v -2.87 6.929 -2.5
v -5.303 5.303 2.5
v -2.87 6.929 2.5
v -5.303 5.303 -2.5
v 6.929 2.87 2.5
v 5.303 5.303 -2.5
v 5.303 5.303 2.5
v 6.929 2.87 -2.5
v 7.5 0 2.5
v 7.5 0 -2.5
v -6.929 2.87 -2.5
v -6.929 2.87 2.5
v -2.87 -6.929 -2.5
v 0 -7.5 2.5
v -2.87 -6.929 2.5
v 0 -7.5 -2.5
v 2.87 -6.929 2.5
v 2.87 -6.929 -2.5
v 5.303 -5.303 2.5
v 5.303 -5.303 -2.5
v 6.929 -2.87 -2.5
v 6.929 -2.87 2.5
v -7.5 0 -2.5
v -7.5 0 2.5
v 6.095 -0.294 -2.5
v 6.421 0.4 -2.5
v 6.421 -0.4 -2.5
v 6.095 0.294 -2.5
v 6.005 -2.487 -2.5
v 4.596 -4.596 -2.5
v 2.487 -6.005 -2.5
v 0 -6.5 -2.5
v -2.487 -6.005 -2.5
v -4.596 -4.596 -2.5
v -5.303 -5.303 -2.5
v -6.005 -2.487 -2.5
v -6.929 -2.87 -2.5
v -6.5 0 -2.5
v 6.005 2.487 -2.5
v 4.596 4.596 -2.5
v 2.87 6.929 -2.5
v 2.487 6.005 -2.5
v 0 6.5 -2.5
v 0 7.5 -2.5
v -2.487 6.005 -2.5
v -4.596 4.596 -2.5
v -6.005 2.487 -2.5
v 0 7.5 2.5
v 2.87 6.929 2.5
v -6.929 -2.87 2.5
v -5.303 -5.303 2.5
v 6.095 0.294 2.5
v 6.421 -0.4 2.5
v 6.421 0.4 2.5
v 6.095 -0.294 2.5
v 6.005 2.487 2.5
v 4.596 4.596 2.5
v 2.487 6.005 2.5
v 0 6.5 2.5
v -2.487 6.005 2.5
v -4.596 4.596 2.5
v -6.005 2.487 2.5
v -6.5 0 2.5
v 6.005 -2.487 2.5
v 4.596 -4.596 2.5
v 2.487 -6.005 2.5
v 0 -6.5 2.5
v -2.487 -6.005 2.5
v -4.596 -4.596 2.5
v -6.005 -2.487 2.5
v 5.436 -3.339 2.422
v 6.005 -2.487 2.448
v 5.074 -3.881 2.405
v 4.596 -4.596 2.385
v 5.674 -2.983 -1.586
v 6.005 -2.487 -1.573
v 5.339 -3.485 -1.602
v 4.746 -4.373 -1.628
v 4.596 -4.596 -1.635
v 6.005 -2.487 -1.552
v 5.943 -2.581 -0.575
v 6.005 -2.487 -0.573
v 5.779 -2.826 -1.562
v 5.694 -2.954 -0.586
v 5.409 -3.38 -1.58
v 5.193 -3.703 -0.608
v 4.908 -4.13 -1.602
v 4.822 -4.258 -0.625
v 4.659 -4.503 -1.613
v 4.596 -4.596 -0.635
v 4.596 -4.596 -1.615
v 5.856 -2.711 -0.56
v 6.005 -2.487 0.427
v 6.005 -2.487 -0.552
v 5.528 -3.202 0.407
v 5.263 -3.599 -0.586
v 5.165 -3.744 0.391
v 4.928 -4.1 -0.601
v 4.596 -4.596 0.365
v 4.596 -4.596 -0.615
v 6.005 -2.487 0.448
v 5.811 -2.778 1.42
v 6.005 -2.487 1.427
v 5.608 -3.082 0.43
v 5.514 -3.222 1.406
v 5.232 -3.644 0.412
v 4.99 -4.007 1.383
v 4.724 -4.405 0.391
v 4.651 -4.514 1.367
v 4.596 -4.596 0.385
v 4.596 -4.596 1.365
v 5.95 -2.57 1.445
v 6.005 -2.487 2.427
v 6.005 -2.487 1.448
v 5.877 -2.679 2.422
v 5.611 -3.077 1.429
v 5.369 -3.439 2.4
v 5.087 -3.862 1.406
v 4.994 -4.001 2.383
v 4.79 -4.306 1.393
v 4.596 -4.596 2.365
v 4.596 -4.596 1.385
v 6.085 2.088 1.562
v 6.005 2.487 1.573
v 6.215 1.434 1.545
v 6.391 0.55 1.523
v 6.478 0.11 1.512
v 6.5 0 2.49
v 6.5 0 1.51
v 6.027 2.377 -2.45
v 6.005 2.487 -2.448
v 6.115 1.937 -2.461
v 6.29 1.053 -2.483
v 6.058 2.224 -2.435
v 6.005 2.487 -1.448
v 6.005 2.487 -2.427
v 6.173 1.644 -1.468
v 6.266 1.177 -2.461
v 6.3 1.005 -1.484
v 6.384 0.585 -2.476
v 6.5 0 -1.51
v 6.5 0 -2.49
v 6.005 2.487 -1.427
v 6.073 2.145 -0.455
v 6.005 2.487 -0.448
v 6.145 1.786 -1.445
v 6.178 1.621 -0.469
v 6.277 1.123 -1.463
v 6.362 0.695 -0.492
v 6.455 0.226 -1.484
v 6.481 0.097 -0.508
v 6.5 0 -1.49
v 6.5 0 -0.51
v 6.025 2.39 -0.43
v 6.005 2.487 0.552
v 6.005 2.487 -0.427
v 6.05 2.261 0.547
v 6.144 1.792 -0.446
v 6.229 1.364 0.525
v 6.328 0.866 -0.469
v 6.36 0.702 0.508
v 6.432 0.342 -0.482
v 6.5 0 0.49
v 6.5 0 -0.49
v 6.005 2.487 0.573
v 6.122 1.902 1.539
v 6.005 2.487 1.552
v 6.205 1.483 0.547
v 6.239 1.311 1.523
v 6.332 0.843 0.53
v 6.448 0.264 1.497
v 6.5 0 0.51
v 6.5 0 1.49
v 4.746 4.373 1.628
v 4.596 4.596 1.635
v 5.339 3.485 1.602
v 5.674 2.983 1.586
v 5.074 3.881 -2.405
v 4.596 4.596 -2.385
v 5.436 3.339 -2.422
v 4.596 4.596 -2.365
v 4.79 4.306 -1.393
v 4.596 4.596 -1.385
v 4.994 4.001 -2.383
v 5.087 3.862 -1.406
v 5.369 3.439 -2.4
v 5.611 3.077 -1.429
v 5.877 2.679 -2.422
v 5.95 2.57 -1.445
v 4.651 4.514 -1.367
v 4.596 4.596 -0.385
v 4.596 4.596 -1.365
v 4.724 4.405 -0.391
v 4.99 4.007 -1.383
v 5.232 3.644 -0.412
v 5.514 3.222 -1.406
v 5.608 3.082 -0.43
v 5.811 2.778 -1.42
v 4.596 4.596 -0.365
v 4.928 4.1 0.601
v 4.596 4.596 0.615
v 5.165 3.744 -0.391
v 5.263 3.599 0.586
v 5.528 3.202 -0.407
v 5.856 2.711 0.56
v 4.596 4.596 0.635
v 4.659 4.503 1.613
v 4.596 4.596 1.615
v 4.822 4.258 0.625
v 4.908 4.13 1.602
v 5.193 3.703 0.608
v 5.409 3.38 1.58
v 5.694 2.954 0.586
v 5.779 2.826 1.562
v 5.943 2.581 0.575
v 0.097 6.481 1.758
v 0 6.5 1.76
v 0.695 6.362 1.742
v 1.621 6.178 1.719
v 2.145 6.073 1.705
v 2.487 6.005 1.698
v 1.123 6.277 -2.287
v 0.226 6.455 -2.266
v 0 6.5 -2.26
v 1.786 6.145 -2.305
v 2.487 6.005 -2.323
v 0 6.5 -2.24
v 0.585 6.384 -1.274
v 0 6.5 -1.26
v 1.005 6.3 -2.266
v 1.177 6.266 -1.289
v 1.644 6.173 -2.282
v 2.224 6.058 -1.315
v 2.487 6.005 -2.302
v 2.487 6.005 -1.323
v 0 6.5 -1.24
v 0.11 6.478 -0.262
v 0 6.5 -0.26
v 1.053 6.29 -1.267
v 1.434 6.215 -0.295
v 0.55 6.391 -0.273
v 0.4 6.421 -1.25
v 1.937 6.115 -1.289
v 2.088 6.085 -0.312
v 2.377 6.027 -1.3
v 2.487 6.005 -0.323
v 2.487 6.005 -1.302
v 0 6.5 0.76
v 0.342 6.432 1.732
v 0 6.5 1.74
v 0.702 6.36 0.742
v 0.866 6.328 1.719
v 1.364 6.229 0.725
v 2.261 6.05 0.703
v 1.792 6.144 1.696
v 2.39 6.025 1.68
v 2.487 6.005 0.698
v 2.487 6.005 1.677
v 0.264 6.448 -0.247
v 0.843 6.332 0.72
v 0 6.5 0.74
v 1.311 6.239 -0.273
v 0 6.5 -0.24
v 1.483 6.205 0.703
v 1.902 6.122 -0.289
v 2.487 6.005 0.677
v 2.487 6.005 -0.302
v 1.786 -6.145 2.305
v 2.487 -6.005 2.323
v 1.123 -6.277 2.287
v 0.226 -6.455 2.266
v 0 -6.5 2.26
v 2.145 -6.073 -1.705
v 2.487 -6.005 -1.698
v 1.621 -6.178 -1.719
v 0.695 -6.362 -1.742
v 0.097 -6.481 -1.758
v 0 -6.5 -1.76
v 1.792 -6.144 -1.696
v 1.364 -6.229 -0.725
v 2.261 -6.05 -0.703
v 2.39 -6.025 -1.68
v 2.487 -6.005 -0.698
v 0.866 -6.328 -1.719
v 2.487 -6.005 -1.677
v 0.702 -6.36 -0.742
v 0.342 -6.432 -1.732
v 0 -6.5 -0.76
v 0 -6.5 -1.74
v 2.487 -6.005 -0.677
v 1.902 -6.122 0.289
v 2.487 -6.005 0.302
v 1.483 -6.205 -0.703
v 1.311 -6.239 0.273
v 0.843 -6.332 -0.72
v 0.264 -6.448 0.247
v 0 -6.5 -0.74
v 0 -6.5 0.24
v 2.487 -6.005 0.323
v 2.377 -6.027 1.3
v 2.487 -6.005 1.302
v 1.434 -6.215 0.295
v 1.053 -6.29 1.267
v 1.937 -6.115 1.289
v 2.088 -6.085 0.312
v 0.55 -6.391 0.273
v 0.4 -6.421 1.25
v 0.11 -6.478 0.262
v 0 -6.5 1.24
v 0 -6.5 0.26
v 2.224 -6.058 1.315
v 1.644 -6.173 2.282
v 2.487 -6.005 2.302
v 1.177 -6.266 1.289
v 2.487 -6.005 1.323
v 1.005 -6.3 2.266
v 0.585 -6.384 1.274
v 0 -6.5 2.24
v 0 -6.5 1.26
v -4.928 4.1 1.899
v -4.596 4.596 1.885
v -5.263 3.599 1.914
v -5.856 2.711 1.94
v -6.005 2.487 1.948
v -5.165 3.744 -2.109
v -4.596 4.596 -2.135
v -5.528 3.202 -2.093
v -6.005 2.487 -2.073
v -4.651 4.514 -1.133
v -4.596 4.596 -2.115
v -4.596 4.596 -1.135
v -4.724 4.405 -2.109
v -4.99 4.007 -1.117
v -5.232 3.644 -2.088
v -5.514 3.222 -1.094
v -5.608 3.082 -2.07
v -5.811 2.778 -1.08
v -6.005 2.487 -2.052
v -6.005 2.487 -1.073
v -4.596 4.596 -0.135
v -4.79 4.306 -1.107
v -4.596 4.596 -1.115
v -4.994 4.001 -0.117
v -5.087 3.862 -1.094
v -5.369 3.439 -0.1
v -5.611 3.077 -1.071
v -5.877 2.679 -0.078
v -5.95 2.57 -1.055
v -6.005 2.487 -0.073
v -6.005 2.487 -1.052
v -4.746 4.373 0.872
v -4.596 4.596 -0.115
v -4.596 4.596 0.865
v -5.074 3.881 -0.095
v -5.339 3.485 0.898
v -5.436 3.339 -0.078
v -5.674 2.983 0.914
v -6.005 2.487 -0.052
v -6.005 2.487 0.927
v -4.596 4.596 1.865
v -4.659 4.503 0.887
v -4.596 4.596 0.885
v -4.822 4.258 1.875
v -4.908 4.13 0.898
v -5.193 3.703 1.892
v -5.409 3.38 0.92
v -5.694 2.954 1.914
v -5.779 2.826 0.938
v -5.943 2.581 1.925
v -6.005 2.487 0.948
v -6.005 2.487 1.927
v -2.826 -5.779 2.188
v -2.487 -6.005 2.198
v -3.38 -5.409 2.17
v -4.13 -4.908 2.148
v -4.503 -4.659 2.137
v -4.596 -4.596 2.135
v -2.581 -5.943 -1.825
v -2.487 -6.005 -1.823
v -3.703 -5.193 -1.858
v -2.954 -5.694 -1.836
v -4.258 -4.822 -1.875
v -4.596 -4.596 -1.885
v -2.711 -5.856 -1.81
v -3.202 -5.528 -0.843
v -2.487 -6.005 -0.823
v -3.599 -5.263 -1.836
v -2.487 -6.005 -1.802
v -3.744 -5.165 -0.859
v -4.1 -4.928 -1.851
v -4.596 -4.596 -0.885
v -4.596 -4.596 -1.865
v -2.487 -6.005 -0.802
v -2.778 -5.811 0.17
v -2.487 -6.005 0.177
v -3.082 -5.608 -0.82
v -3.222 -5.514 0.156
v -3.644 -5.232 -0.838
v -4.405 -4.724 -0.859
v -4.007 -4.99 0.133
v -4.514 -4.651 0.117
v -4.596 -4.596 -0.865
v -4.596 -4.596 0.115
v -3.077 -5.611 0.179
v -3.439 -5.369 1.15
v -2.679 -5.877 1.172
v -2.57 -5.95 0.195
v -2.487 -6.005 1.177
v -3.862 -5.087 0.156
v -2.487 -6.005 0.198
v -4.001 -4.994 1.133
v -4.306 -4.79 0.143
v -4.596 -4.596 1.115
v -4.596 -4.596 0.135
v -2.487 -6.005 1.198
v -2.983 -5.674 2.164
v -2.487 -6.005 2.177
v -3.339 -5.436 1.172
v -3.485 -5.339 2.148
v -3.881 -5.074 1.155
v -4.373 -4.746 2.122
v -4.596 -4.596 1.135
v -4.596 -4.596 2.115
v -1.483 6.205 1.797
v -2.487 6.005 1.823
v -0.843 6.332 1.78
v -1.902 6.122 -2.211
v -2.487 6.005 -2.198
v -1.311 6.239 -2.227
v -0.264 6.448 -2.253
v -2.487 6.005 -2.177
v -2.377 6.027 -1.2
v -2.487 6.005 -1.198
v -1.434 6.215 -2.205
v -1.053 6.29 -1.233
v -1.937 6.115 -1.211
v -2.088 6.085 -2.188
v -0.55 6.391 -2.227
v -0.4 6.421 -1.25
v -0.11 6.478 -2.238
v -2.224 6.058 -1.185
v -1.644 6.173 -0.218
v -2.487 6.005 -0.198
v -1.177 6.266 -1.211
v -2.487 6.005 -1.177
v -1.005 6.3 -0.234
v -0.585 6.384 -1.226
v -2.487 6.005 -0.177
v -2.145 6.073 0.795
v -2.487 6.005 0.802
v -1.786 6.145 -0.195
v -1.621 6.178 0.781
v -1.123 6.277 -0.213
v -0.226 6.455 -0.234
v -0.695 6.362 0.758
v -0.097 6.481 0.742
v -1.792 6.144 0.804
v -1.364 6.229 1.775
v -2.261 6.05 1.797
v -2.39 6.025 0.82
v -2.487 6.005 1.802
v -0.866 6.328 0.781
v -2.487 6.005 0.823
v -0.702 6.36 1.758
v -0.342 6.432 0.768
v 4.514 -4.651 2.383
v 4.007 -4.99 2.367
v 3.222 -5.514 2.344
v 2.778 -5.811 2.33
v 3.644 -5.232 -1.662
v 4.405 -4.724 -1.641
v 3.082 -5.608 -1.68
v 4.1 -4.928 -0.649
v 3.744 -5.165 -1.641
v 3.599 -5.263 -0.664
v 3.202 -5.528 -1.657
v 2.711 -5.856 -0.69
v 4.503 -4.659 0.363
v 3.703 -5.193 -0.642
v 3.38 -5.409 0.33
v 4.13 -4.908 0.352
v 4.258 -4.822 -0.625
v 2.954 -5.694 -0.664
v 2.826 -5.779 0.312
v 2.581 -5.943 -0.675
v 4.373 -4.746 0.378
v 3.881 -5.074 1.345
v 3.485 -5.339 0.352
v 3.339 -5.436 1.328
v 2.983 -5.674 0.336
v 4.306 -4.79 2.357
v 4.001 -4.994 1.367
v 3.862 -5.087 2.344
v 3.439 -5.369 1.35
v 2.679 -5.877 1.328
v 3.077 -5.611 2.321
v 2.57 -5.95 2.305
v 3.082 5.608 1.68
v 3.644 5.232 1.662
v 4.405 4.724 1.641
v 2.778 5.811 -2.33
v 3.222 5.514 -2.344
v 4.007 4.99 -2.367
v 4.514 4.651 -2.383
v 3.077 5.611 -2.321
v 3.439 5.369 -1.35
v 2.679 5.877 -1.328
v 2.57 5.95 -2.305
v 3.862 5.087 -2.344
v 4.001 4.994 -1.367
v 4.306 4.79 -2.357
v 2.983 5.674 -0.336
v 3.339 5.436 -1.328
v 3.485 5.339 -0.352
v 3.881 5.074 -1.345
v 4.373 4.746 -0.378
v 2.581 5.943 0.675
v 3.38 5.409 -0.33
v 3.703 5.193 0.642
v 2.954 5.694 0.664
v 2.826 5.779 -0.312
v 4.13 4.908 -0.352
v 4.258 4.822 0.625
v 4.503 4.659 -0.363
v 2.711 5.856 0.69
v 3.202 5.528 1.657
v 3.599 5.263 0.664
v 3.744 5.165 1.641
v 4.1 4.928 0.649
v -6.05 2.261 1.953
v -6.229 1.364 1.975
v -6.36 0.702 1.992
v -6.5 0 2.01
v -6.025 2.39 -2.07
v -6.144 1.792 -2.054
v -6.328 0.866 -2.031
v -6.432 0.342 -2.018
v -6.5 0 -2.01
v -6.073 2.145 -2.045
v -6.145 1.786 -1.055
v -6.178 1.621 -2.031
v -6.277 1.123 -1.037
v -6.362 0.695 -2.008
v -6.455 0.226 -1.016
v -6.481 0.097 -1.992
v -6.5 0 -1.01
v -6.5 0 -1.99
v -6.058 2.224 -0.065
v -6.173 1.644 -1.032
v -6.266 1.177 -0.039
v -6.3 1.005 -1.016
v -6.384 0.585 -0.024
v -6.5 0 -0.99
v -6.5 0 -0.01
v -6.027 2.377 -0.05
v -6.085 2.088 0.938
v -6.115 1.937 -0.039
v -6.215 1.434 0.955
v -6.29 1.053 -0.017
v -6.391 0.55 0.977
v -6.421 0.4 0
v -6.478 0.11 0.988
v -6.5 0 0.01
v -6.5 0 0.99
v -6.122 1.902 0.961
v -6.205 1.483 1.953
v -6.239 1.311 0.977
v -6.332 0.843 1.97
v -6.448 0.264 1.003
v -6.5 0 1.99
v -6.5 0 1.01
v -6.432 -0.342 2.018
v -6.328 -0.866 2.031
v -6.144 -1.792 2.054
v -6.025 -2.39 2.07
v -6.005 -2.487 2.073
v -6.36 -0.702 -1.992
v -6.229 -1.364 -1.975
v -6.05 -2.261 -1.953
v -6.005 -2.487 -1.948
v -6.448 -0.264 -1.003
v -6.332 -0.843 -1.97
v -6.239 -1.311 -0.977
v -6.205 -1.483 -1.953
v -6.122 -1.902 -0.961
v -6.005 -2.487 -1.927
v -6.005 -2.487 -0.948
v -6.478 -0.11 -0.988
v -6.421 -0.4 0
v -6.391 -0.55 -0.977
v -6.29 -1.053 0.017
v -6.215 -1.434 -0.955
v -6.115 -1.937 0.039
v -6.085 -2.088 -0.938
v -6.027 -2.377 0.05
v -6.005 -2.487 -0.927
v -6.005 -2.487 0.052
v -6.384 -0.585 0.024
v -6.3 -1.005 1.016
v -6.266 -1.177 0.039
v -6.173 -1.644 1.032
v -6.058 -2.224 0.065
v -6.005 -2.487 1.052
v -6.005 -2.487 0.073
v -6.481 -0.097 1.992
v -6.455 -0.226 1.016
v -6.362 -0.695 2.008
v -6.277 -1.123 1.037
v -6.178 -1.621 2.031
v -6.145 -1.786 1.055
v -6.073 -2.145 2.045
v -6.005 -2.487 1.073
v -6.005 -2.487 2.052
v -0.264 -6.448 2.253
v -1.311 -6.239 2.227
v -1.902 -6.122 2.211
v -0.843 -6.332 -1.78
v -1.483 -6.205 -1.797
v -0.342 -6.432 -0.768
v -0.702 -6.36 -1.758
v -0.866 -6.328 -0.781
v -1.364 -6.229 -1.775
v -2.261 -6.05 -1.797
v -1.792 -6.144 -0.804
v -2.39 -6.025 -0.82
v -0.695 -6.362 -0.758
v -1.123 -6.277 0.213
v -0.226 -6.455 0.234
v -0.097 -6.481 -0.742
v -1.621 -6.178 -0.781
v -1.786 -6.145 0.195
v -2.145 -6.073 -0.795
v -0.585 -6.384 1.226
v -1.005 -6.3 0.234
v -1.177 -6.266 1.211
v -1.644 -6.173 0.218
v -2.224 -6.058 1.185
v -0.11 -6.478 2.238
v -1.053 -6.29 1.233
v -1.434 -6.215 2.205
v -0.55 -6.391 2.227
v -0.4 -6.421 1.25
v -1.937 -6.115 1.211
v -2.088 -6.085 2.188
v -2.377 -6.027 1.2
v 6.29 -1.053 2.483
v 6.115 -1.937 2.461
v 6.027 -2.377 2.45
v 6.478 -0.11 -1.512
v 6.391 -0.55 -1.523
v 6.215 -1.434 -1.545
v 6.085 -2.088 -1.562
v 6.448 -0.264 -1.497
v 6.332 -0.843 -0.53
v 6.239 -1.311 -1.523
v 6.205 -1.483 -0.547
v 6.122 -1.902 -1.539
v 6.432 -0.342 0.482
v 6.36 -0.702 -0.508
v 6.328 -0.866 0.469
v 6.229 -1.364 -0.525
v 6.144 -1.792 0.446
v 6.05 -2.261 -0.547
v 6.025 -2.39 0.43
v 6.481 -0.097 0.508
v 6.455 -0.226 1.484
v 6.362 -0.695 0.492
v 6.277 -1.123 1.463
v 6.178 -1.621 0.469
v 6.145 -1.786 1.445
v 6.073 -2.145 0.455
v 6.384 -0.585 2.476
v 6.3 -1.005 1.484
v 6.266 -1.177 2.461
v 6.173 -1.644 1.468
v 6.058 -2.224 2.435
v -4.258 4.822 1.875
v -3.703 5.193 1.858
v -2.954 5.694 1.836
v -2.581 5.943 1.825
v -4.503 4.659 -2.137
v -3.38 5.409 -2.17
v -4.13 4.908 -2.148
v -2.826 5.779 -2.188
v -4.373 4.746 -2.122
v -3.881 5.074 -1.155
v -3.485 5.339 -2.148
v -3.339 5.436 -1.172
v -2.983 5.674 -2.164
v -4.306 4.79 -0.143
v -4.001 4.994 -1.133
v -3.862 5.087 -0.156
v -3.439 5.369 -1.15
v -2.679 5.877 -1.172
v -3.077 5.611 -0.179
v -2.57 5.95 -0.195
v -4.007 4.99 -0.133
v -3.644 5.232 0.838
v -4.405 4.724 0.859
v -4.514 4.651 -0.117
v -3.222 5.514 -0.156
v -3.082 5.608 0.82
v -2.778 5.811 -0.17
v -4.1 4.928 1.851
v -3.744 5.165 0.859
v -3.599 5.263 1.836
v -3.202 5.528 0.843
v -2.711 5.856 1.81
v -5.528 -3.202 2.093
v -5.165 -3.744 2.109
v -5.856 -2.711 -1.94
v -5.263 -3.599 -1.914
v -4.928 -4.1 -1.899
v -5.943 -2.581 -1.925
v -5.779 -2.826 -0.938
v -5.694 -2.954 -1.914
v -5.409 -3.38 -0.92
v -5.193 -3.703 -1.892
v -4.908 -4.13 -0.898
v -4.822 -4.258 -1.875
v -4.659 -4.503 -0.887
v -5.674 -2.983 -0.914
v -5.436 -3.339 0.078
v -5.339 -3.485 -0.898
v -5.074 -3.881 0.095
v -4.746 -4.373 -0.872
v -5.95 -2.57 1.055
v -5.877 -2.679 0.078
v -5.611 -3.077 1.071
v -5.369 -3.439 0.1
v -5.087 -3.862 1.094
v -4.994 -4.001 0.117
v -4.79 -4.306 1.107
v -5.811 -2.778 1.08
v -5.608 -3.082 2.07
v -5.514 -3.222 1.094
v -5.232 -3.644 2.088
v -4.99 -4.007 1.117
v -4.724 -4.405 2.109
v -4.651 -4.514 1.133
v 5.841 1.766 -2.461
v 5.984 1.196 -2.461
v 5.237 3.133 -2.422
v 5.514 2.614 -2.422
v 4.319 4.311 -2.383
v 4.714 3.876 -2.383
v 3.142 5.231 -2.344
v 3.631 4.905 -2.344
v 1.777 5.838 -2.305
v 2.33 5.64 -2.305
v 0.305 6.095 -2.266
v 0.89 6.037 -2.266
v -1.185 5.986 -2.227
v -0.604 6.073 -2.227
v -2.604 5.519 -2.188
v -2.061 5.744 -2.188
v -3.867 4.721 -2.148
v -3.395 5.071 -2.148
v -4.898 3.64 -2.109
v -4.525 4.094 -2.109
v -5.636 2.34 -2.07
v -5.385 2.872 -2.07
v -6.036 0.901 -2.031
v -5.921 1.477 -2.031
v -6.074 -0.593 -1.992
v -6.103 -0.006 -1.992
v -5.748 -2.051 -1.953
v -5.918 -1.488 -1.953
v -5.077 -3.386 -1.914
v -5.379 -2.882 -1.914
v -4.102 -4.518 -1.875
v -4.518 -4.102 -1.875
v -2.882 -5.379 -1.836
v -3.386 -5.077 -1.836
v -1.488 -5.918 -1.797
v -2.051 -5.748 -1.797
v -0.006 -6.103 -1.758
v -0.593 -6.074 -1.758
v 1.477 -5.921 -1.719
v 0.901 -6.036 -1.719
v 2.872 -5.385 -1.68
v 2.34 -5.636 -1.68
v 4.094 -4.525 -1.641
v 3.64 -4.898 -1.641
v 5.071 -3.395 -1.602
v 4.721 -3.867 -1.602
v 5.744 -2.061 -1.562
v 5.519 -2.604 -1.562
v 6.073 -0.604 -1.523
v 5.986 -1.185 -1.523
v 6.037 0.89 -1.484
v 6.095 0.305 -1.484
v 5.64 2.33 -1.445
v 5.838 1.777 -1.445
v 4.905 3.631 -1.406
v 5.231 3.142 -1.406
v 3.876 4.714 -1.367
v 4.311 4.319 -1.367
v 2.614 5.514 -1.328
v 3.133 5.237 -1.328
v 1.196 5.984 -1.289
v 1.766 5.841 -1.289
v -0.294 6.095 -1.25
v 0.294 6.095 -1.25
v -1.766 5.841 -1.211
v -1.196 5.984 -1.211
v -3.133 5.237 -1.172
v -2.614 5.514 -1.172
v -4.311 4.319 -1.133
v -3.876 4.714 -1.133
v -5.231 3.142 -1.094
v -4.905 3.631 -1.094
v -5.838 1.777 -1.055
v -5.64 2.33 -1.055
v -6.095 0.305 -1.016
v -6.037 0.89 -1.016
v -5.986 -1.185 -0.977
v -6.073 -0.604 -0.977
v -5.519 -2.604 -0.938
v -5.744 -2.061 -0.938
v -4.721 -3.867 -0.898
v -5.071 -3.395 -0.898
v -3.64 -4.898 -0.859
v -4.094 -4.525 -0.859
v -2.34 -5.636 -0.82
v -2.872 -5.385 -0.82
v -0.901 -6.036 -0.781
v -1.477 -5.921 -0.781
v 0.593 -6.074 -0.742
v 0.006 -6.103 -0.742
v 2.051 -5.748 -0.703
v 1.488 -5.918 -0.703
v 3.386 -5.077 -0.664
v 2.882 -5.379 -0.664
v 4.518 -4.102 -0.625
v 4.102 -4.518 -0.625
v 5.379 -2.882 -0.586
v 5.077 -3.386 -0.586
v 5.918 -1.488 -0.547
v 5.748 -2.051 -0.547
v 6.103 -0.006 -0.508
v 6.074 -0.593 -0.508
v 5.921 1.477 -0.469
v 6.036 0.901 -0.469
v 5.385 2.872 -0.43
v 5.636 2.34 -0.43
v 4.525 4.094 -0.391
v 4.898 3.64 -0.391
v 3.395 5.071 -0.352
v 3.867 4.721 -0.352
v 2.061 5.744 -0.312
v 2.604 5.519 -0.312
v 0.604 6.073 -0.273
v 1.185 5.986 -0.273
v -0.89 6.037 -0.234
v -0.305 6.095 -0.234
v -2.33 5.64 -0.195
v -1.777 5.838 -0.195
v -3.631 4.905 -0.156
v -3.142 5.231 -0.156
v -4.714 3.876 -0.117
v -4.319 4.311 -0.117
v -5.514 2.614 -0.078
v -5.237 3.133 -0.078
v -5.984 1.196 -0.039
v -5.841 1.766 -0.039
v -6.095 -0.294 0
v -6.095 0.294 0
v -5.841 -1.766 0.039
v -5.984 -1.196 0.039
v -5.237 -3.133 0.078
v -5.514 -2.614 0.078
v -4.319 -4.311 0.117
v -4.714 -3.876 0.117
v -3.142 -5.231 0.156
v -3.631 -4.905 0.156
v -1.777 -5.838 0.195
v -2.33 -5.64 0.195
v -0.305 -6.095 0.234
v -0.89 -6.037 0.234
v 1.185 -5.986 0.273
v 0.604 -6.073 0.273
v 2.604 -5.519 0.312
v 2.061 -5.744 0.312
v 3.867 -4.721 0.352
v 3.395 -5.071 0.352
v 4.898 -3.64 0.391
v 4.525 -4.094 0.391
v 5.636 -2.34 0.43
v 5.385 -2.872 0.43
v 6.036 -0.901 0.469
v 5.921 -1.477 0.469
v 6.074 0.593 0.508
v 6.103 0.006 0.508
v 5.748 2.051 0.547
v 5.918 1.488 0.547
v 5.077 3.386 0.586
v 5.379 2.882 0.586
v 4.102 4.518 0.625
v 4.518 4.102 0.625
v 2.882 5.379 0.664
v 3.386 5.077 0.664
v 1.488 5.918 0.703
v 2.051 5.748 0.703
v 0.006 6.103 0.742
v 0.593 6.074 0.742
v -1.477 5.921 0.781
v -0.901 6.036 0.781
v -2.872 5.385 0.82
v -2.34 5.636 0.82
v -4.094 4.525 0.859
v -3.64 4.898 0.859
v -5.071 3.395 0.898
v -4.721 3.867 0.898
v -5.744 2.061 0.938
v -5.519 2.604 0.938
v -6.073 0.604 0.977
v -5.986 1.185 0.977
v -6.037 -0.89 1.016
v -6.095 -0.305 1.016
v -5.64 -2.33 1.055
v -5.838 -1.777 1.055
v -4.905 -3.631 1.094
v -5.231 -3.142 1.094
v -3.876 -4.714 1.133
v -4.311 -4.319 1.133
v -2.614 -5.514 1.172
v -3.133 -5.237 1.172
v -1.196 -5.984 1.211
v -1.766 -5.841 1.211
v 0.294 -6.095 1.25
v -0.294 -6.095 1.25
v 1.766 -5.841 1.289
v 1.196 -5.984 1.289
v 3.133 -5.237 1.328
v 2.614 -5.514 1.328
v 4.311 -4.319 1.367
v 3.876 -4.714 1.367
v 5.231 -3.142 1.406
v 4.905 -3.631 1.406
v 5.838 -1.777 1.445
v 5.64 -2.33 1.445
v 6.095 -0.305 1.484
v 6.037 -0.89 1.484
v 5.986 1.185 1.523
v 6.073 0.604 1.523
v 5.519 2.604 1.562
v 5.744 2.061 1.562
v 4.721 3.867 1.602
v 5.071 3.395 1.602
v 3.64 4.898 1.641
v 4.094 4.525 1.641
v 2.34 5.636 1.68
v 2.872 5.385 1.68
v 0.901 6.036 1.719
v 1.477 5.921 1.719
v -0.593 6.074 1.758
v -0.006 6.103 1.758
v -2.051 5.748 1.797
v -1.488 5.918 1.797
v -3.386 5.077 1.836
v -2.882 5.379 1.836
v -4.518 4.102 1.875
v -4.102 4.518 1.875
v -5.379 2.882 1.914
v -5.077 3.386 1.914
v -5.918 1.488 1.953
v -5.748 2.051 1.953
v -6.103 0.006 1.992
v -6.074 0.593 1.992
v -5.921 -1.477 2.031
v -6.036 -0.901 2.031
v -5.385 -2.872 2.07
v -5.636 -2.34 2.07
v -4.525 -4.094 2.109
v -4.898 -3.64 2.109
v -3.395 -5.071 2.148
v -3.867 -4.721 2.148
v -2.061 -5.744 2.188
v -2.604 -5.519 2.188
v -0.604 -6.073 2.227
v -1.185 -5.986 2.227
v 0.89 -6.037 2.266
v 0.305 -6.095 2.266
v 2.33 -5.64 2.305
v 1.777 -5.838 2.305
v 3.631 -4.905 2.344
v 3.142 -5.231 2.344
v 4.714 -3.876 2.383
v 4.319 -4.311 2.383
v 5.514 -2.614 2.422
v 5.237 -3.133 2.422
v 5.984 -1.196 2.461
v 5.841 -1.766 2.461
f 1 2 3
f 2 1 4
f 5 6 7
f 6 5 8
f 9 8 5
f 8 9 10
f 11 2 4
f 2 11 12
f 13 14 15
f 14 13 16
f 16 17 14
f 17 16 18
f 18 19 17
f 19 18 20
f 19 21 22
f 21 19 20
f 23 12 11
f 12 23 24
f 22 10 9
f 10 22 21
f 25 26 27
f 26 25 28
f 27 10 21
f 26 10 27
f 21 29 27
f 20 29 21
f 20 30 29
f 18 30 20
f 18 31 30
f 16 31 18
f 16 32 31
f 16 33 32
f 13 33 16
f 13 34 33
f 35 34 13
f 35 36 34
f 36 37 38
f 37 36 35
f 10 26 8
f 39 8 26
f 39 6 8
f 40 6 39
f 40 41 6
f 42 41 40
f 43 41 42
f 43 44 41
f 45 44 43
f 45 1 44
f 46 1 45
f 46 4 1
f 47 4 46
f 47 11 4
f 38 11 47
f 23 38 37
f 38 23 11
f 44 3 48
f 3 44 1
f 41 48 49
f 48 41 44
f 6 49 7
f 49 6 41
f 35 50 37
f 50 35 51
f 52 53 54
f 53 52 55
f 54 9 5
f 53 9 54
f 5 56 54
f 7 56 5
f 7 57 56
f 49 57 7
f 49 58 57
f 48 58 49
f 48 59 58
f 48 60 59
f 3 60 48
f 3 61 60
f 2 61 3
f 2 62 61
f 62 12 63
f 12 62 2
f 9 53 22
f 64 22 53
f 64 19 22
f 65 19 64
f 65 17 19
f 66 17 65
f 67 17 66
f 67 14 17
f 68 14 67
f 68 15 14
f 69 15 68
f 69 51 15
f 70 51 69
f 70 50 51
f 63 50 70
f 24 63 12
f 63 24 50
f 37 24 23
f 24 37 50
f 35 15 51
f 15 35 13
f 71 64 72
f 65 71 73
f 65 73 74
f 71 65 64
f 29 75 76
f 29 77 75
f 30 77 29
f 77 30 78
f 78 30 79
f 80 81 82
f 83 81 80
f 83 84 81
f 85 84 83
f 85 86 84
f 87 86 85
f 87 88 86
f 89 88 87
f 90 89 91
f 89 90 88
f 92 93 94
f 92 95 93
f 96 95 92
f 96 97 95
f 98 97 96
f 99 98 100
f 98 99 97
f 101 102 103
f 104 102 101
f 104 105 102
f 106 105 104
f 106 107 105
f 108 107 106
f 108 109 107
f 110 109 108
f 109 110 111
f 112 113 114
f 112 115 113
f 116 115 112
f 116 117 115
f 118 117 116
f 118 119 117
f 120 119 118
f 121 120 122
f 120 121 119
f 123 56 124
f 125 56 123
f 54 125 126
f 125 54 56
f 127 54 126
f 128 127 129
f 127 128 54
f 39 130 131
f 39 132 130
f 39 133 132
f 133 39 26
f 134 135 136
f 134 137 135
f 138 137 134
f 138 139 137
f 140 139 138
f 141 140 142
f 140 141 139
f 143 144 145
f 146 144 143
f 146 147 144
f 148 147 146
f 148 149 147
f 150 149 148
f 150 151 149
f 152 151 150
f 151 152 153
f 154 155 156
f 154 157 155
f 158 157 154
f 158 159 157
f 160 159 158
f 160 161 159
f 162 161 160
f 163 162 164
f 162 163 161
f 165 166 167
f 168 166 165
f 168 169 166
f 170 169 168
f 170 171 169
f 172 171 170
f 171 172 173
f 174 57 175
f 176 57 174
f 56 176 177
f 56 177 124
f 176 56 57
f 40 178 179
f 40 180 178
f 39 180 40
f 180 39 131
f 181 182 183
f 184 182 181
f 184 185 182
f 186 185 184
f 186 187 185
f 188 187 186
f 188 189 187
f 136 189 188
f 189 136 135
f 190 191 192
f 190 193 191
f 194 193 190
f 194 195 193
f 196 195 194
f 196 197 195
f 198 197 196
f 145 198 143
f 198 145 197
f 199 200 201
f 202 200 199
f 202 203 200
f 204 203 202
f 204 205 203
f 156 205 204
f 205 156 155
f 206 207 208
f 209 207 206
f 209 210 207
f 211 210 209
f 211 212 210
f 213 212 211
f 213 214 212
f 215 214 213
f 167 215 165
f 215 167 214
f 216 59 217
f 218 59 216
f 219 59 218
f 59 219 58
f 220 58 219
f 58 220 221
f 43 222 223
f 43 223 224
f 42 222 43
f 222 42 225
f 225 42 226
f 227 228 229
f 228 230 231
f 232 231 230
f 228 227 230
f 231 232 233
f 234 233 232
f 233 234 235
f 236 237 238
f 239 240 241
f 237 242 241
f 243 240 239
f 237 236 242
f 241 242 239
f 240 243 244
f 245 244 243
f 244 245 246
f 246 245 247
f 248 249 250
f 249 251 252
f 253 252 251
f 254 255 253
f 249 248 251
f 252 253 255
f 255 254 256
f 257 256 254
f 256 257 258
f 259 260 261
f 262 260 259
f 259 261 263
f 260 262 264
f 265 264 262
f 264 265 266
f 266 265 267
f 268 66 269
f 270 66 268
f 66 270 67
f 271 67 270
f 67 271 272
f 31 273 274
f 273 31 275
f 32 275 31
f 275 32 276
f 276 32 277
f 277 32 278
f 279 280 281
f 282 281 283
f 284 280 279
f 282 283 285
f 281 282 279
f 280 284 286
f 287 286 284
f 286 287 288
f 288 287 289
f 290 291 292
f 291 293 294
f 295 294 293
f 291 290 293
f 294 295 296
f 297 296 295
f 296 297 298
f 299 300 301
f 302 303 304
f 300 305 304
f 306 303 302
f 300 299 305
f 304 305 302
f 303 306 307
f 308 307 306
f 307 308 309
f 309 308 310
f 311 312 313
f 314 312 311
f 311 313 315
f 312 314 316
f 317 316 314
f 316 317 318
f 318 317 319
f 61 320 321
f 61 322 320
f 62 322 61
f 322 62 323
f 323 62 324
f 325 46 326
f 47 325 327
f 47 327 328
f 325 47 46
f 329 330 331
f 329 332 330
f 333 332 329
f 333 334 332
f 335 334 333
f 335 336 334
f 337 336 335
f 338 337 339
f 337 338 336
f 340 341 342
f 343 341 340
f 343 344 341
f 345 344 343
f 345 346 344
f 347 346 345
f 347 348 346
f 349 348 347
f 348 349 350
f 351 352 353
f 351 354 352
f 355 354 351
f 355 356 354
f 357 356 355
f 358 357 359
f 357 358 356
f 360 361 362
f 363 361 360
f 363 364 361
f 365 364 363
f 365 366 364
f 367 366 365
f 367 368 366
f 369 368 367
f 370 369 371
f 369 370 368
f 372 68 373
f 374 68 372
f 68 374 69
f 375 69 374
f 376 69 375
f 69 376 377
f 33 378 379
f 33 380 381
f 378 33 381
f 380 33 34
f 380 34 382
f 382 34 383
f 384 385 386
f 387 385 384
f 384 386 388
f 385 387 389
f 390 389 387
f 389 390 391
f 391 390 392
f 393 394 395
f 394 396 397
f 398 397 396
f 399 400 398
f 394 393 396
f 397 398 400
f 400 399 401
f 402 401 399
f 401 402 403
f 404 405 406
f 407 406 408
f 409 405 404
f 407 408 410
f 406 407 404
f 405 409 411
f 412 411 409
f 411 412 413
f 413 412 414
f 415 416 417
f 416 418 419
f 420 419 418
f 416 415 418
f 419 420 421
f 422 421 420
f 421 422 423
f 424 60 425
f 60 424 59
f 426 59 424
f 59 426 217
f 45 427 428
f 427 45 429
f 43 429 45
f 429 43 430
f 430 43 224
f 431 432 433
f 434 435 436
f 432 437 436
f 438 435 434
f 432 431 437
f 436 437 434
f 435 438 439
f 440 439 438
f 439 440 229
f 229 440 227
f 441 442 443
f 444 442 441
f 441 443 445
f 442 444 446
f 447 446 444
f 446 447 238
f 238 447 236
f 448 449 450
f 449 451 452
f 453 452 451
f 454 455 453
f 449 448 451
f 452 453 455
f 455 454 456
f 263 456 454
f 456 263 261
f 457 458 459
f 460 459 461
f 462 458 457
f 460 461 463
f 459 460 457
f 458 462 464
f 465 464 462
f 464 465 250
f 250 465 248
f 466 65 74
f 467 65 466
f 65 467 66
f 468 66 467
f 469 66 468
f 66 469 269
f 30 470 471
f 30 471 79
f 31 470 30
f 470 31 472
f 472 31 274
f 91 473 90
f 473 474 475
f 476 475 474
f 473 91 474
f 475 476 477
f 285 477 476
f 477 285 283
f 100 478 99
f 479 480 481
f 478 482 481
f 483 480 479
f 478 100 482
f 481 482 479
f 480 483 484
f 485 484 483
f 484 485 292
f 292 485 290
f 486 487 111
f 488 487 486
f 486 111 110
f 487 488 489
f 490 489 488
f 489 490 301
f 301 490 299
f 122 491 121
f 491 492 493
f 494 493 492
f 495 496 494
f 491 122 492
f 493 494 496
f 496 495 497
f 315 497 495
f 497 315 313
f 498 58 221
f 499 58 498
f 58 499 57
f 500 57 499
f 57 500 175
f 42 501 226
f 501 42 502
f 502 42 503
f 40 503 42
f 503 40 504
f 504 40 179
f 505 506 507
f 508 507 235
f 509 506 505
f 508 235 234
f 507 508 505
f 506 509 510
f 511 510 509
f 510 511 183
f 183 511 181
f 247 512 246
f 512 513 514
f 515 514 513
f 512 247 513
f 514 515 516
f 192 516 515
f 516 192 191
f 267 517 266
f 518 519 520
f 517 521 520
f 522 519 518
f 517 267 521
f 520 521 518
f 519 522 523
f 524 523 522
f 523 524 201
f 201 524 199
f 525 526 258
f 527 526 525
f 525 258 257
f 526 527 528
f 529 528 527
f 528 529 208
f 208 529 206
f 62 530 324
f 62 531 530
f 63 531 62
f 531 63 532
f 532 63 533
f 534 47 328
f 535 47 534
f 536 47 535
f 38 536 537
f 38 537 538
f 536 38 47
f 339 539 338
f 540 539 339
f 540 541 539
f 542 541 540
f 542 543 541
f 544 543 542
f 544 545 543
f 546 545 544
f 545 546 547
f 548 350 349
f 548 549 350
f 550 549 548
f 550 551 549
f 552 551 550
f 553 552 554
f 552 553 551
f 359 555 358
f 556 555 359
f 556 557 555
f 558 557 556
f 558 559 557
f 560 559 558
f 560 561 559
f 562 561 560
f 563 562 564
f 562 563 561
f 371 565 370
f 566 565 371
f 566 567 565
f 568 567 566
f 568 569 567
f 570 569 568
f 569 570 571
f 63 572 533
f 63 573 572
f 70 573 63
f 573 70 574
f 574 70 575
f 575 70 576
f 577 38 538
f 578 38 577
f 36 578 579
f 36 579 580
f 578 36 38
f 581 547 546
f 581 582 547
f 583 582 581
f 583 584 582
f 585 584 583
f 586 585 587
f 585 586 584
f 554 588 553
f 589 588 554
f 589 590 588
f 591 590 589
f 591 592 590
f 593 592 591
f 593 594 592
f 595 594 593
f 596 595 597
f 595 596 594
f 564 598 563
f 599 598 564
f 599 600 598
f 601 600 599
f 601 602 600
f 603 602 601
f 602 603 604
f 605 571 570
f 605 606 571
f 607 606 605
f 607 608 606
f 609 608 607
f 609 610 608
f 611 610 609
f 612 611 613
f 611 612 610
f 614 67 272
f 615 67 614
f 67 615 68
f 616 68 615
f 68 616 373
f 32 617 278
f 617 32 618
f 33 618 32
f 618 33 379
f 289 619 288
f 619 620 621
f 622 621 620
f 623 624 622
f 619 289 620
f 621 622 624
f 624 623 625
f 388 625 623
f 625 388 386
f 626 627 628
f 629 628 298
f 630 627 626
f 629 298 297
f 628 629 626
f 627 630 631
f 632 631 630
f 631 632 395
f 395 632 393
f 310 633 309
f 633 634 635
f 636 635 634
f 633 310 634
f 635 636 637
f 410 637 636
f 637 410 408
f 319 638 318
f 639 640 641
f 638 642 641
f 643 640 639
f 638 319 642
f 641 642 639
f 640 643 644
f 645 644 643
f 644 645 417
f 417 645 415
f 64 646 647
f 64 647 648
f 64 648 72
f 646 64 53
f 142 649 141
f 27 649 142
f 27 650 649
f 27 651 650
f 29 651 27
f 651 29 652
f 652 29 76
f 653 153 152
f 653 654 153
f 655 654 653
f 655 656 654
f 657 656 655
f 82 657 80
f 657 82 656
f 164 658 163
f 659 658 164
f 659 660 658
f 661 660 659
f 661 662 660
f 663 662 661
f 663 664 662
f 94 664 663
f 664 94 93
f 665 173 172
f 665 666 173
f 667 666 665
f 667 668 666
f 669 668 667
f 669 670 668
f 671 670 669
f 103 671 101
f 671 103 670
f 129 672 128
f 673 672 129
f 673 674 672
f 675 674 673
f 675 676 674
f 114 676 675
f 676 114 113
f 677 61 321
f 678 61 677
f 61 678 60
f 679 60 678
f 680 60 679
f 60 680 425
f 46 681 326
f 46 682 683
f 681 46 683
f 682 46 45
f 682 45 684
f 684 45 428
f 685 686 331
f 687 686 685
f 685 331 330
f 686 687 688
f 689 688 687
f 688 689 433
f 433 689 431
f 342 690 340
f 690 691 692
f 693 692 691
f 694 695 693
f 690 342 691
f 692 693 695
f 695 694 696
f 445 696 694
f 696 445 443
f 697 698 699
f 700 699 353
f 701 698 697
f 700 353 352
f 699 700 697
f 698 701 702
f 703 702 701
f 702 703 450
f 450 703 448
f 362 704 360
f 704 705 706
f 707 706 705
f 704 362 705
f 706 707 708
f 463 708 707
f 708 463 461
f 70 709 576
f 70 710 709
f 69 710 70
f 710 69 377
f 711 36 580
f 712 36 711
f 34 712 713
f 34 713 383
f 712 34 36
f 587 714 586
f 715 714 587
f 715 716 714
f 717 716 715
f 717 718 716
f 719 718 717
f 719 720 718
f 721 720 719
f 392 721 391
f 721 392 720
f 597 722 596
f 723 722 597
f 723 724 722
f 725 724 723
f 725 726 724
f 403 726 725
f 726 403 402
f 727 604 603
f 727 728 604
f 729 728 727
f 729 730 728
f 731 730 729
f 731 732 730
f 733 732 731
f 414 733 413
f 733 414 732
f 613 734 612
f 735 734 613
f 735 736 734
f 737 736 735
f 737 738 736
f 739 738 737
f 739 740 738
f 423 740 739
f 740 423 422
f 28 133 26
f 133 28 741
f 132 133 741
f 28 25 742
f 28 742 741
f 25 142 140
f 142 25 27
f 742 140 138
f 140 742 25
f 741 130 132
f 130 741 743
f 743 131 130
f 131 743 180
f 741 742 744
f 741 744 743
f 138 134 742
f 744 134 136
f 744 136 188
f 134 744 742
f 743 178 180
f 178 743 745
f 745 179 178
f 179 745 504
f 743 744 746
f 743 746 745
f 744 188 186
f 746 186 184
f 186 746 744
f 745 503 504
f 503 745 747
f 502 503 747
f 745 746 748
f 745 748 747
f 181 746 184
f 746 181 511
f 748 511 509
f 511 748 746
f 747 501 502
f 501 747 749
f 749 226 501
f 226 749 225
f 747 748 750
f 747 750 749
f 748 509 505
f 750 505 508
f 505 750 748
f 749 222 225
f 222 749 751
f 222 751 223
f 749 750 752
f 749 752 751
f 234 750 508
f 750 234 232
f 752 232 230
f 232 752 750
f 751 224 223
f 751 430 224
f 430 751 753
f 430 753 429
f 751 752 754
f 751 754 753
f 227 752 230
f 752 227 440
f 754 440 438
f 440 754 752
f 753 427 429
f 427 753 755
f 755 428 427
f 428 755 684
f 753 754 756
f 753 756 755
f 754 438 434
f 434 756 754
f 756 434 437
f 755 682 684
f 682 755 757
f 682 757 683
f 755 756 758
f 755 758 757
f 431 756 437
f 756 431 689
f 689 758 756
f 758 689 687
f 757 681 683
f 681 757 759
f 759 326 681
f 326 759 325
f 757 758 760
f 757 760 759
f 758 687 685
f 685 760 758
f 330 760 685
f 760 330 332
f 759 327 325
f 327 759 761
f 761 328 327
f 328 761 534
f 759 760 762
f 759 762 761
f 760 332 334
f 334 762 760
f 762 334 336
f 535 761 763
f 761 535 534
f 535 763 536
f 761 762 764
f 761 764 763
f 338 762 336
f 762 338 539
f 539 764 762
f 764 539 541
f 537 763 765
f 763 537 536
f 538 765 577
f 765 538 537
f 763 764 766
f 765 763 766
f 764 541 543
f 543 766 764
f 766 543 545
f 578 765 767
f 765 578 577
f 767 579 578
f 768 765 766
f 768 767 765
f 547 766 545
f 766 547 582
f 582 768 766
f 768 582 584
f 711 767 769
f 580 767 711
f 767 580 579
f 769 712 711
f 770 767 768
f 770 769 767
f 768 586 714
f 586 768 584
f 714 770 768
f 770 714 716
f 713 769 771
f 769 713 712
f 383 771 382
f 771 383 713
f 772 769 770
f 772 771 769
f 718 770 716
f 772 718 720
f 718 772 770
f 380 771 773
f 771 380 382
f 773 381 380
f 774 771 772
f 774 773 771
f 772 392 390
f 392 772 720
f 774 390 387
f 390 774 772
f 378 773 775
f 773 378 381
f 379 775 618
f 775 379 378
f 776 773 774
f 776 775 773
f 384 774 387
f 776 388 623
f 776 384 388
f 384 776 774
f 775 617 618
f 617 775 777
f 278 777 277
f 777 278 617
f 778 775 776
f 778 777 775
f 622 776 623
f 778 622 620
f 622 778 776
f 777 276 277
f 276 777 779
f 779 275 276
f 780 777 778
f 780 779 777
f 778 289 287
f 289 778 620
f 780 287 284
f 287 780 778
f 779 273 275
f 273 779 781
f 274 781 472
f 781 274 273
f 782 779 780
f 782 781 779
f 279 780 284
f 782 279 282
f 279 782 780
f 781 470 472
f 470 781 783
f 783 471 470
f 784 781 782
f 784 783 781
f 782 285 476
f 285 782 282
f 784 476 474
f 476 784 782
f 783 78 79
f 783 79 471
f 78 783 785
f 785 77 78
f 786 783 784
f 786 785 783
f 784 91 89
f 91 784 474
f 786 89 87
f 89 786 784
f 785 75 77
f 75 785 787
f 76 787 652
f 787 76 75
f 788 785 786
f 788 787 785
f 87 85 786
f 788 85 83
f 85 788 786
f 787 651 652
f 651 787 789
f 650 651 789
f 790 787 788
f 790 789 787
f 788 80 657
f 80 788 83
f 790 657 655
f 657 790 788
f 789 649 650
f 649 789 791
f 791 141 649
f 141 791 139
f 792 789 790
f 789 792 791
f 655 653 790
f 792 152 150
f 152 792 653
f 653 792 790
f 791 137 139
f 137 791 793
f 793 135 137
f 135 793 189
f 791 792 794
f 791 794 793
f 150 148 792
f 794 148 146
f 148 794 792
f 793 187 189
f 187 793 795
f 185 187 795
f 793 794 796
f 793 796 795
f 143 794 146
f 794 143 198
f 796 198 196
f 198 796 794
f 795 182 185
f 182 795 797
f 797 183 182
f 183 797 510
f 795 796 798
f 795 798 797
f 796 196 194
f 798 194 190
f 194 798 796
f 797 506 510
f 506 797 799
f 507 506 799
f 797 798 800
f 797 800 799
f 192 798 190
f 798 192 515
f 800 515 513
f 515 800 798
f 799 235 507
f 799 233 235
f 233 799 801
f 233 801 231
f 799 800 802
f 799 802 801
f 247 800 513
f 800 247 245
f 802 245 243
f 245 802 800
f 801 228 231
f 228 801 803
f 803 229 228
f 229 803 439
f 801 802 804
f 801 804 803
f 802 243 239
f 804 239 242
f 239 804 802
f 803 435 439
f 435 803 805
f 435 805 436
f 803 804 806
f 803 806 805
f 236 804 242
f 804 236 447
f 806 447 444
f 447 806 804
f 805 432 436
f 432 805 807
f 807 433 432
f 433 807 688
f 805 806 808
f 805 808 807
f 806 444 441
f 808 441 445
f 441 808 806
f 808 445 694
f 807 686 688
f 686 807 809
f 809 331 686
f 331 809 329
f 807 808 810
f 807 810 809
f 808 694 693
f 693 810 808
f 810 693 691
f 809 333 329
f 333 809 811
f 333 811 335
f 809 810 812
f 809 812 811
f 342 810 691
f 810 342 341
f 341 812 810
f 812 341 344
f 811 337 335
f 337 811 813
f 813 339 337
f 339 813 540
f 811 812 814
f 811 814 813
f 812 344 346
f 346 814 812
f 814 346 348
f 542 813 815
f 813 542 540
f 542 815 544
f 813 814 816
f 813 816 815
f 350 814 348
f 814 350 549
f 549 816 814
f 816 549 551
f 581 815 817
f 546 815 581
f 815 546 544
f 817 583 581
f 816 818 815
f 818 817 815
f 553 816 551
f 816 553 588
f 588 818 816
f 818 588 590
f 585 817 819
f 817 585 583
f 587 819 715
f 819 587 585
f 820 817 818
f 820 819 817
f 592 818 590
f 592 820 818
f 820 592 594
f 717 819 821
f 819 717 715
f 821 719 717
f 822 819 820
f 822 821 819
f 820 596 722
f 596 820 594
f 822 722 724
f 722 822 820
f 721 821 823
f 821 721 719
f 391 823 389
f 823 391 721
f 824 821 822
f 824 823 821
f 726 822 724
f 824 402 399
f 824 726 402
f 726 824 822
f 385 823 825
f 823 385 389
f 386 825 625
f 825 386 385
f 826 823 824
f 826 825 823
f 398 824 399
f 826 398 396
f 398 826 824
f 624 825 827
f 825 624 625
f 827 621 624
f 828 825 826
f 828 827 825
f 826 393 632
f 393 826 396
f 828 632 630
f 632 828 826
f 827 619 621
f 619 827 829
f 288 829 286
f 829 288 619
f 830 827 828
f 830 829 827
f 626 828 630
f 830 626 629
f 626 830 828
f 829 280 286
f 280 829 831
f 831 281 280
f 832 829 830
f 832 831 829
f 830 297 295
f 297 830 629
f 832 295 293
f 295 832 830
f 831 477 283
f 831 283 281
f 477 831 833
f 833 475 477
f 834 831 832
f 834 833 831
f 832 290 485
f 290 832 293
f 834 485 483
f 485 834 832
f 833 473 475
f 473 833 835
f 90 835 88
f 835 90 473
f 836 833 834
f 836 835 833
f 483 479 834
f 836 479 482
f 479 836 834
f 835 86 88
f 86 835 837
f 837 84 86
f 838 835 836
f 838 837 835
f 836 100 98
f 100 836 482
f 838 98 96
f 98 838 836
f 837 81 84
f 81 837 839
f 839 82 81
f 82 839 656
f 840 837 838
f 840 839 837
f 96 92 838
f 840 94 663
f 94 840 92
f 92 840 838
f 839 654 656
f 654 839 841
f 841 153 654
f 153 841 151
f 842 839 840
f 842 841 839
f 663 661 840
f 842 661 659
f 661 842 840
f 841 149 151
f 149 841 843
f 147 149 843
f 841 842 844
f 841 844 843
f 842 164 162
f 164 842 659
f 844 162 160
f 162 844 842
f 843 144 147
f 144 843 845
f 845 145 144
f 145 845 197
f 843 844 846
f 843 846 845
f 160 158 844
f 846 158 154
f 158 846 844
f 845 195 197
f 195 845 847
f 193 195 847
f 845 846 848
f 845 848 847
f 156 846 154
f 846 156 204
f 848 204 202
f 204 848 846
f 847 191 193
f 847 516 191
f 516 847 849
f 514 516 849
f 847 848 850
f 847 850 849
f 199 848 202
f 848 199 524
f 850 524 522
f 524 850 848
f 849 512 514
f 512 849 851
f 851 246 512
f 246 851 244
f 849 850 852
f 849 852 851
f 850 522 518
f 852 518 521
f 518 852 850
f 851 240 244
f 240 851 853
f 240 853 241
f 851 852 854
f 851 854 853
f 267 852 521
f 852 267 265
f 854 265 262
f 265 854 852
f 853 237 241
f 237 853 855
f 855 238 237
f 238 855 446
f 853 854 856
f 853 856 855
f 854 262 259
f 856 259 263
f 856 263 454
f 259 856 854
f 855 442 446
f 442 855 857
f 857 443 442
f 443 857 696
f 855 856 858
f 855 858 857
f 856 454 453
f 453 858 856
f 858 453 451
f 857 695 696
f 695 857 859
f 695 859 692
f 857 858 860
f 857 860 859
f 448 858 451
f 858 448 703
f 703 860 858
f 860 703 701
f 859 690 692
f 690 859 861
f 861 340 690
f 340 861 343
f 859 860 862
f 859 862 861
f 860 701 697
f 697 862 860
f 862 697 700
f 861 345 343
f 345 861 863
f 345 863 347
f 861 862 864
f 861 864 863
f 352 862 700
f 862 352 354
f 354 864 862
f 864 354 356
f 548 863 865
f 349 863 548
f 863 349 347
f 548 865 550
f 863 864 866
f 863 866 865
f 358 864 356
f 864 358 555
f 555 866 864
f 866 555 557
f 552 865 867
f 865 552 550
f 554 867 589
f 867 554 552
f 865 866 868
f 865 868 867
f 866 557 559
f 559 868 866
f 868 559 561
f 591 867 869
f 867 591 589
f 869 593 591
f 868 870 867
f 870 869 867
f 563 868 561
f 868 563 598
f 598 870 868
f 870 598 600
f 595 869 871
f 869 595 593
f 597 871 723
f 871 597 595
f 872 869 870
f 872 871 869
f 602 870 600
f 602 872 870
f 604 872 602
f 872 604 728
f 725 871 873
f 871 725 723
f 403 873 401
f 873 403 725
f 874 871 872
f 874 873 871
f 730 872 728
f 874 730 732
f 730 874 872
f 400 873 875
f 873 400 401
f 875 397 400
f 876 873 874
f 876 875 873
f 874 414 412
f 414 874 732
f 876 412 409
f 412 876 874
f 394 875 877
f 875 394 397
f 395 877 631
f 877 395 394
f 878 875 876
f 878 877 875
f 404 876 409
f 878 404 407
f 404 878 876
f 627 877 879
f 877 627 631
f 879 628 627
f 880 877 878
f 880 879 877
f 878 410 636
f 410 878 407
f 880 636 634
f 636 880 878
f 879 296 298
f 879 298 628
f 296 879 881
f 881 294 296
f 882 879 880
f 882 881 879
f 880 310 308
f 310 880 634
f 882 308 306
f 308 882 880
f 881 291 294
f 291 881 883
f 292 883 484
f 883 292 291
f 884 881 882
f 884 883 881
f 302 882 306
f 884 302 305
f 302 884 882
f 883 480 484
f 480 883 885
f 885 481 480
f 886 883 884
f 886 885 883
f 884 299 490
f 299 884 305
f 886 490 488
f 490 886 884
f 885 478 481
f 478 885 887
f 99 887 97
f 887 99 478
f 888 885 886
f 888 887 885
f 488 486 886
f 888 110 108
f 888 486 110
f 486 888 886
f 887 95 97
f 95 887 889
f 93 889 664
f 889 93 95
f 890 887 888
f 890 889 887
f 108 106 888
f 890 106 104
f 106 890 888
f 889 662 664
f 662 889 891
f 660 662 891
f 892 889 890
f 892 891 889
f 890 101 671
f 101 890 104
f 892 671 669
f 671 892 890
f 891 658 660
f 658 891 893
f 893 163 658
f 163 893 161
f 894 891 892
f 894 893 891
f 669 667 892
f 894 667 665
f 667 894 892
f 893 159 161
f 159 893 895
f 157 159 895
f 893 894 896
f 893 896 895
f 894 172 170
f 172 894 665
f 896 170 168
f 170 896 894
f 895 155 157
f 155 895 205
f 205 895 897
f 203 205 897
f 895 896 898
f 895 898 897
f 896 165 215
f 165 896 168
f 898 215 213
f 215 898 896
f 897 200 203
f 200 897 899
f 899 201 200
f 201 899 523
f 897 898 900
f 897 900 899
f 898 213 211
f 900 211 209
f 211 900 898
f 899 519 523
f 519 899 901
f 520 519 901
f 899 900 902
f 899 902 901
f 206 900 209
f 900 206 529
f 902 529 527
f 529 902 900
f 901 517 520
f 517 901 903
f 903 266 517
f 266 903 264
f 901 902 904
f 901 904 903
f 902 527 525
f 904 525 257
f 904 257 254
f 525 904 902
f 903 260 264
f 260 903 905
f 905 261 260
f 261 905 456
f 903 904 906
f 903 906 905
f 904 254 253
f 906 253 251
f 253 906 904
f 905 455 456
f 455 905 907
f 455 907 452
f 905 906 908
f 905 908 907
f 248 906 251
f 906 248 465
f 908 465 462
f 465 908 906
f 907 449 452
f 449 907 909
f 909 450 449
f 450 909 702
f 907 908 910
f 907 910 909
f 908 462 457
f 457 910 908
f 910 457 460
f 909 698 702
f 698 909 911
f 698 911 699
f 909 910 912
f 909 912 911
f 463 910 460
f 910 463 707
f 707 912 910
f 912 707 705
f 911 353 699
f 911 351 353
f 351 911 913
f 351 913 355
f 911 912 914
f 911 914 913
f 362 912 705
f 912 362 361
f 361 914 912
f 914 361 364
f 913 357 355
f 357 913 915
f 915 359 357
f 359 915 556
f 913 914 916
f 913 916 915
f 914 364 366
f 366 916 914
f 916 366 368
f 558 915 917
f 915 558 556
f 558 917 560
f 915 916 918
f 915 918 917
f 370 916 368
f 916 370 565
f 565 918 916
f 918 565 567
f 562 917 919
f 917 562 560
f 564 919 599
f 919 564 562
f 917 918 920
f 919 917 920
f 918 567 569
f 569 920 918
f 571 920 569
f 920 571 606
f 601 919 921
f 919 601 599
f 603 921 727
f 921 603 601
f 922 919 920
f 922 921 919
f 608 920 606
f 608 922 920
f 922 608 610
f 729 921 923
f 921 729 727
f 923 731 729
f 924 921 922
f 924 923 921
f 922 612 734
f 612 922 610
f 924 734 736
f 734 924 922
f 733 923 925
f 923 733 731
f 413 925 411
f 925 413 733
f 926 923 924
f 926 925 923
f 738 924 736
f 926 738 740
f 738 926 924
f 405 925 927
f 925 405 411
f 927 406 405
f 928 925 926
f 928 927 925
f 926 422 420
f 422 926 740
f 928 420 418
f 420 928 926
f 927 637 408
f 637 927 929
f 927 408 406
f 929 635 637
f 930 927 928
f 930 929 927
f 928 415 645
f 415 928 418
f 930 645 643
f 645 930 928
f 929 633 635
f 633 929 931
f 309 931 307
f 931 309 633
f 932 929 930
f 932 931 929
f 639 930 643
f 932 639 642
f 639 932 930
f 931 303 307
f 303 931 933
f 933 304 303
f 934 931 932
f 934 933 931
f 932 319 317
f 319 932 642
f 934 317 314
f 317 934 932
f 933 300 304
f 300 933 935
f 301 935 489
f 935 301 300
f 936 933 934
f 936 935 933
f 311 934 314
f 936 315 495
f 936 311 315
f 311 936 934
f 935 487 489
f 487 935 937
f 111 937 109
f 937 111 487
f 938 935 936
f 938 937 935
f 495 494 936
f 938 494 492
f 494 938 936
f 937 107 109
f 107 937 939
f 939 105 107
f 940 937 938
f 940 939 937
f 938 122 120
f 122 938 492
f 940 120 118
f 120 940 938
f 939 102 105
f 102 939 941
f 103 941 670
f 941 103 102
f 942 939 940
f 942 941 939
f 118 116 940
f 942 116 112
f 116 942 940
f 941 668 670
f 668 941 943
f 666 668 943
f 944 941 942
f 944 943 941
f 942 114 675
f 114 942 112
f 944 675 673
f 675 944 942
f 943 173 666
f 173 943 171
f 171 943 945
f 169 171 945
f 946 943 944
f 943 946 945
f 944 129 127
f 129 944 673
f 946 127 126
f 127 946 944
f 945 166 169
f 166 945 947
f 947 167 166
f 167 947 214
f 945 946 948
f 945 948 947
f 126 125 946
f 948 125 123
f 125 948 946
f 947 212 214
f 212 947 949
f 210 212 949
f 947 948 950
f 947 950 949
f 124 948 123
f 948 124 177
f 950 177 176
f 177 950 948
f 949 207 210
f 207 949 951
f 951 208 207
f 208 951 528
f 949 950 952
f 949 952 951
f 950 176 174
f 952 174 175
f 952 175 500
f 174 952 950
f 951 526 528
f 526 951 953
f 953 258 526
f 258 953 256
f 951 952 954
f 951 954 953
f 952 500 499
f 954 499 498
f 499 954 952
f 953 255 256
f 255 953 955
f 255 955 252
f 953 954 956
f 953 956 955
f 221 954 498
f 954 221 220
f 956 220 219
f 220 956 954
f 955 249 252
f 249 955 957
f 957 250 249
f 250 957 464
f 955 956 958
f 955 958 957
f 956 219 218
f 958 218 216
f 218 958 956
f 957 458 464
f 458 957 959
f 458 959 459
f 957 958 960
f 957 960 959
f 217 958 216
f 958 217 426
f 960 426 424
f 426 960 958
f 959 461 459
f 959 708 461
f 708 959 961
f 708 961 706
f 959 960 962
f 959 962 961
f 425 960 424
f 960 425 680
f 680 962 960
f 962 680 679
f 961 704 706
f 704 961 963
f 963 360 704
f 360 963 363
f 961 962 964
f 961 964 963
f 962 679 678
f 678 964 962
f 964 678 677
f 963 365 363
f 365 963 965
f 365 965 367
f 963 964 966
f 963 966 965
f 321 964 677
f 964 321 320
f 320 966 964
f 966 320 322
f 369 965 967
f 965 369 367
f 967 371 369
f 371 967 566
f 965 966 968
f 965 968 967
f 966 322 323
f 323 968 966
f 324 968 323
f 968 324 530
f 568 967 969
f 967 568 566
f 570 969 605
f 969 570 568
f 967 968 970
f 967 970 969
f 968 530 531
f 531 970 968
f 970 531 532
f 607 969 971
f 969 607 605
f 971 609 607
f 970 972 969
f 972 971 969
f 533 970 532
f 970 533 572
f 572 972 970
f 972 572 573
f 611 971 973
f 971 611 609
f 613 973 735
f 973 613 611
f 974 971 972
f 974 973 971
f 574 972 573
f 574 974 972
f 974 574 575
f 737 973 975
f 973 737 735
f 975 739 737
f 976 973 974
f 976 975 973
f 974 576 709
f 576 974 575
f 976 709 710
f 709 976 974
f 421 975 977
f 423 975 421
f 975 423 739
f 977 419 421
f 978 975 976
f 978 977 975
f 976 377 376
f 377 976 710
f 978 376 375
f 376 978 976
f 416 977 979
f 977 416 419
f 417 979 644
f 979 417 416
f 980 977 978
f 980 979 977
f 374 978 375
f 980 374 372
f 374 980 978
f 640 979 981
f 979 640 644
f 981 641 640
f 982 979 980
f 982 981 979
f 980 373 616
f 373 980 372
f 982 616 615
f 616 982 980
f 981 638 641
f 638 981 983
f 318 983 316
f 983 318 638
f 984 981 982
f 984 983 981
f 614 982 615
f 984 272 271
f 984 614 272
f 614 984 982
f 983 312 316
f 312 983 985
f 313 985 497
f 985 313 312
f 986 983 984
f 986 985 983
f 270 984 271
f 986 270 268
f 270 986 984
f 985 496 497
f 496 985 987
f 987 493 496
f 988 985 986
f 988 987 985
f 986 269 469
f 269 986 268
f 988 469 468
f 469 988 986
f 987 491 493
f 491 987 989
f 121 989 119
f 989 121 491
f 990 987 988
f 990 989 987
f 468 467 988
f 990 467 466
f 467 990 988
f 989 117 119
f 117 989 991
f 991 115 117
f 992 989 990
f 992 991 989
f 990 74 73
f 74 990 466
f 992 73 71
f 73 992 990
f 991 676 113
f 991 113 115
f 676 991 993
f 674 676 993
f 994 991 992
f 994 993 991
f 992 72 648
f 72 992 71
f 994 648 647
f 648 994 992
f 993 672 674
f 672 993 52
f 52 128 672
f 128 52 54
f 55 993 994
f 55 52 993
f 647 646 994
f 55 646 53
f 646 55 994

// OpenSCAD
// file: ../primitives/tube.scad
module tube(h, dint, dext, center = false) {
    difference() {
        cylinder(h = h, d = dext, center = center);
        cylinder(h = h + 0.1, d = dint, center = center);
    }
}
// main file
include <../primitives/tube.scad>

module thread(dint = 12, oExt = 1, height = 10, pitch = 1, slices = 128) {
    twist = (-360 * height) / pitch;

    linear_extrude(
        height = height, center = true, convexity = 10,
        twist = twist, slices = slices
    ) translate([dint/2 + oExt/2, 0, 0]) {
        circle(r = oExt/2);
    }
}

union() {
    tube(h = 5, dint = 13, dext = 15, center = true, $fn = 16);
    thread(dint = 12, oExt = 1, height = 5, pitch = 1, slices = 128);
}
